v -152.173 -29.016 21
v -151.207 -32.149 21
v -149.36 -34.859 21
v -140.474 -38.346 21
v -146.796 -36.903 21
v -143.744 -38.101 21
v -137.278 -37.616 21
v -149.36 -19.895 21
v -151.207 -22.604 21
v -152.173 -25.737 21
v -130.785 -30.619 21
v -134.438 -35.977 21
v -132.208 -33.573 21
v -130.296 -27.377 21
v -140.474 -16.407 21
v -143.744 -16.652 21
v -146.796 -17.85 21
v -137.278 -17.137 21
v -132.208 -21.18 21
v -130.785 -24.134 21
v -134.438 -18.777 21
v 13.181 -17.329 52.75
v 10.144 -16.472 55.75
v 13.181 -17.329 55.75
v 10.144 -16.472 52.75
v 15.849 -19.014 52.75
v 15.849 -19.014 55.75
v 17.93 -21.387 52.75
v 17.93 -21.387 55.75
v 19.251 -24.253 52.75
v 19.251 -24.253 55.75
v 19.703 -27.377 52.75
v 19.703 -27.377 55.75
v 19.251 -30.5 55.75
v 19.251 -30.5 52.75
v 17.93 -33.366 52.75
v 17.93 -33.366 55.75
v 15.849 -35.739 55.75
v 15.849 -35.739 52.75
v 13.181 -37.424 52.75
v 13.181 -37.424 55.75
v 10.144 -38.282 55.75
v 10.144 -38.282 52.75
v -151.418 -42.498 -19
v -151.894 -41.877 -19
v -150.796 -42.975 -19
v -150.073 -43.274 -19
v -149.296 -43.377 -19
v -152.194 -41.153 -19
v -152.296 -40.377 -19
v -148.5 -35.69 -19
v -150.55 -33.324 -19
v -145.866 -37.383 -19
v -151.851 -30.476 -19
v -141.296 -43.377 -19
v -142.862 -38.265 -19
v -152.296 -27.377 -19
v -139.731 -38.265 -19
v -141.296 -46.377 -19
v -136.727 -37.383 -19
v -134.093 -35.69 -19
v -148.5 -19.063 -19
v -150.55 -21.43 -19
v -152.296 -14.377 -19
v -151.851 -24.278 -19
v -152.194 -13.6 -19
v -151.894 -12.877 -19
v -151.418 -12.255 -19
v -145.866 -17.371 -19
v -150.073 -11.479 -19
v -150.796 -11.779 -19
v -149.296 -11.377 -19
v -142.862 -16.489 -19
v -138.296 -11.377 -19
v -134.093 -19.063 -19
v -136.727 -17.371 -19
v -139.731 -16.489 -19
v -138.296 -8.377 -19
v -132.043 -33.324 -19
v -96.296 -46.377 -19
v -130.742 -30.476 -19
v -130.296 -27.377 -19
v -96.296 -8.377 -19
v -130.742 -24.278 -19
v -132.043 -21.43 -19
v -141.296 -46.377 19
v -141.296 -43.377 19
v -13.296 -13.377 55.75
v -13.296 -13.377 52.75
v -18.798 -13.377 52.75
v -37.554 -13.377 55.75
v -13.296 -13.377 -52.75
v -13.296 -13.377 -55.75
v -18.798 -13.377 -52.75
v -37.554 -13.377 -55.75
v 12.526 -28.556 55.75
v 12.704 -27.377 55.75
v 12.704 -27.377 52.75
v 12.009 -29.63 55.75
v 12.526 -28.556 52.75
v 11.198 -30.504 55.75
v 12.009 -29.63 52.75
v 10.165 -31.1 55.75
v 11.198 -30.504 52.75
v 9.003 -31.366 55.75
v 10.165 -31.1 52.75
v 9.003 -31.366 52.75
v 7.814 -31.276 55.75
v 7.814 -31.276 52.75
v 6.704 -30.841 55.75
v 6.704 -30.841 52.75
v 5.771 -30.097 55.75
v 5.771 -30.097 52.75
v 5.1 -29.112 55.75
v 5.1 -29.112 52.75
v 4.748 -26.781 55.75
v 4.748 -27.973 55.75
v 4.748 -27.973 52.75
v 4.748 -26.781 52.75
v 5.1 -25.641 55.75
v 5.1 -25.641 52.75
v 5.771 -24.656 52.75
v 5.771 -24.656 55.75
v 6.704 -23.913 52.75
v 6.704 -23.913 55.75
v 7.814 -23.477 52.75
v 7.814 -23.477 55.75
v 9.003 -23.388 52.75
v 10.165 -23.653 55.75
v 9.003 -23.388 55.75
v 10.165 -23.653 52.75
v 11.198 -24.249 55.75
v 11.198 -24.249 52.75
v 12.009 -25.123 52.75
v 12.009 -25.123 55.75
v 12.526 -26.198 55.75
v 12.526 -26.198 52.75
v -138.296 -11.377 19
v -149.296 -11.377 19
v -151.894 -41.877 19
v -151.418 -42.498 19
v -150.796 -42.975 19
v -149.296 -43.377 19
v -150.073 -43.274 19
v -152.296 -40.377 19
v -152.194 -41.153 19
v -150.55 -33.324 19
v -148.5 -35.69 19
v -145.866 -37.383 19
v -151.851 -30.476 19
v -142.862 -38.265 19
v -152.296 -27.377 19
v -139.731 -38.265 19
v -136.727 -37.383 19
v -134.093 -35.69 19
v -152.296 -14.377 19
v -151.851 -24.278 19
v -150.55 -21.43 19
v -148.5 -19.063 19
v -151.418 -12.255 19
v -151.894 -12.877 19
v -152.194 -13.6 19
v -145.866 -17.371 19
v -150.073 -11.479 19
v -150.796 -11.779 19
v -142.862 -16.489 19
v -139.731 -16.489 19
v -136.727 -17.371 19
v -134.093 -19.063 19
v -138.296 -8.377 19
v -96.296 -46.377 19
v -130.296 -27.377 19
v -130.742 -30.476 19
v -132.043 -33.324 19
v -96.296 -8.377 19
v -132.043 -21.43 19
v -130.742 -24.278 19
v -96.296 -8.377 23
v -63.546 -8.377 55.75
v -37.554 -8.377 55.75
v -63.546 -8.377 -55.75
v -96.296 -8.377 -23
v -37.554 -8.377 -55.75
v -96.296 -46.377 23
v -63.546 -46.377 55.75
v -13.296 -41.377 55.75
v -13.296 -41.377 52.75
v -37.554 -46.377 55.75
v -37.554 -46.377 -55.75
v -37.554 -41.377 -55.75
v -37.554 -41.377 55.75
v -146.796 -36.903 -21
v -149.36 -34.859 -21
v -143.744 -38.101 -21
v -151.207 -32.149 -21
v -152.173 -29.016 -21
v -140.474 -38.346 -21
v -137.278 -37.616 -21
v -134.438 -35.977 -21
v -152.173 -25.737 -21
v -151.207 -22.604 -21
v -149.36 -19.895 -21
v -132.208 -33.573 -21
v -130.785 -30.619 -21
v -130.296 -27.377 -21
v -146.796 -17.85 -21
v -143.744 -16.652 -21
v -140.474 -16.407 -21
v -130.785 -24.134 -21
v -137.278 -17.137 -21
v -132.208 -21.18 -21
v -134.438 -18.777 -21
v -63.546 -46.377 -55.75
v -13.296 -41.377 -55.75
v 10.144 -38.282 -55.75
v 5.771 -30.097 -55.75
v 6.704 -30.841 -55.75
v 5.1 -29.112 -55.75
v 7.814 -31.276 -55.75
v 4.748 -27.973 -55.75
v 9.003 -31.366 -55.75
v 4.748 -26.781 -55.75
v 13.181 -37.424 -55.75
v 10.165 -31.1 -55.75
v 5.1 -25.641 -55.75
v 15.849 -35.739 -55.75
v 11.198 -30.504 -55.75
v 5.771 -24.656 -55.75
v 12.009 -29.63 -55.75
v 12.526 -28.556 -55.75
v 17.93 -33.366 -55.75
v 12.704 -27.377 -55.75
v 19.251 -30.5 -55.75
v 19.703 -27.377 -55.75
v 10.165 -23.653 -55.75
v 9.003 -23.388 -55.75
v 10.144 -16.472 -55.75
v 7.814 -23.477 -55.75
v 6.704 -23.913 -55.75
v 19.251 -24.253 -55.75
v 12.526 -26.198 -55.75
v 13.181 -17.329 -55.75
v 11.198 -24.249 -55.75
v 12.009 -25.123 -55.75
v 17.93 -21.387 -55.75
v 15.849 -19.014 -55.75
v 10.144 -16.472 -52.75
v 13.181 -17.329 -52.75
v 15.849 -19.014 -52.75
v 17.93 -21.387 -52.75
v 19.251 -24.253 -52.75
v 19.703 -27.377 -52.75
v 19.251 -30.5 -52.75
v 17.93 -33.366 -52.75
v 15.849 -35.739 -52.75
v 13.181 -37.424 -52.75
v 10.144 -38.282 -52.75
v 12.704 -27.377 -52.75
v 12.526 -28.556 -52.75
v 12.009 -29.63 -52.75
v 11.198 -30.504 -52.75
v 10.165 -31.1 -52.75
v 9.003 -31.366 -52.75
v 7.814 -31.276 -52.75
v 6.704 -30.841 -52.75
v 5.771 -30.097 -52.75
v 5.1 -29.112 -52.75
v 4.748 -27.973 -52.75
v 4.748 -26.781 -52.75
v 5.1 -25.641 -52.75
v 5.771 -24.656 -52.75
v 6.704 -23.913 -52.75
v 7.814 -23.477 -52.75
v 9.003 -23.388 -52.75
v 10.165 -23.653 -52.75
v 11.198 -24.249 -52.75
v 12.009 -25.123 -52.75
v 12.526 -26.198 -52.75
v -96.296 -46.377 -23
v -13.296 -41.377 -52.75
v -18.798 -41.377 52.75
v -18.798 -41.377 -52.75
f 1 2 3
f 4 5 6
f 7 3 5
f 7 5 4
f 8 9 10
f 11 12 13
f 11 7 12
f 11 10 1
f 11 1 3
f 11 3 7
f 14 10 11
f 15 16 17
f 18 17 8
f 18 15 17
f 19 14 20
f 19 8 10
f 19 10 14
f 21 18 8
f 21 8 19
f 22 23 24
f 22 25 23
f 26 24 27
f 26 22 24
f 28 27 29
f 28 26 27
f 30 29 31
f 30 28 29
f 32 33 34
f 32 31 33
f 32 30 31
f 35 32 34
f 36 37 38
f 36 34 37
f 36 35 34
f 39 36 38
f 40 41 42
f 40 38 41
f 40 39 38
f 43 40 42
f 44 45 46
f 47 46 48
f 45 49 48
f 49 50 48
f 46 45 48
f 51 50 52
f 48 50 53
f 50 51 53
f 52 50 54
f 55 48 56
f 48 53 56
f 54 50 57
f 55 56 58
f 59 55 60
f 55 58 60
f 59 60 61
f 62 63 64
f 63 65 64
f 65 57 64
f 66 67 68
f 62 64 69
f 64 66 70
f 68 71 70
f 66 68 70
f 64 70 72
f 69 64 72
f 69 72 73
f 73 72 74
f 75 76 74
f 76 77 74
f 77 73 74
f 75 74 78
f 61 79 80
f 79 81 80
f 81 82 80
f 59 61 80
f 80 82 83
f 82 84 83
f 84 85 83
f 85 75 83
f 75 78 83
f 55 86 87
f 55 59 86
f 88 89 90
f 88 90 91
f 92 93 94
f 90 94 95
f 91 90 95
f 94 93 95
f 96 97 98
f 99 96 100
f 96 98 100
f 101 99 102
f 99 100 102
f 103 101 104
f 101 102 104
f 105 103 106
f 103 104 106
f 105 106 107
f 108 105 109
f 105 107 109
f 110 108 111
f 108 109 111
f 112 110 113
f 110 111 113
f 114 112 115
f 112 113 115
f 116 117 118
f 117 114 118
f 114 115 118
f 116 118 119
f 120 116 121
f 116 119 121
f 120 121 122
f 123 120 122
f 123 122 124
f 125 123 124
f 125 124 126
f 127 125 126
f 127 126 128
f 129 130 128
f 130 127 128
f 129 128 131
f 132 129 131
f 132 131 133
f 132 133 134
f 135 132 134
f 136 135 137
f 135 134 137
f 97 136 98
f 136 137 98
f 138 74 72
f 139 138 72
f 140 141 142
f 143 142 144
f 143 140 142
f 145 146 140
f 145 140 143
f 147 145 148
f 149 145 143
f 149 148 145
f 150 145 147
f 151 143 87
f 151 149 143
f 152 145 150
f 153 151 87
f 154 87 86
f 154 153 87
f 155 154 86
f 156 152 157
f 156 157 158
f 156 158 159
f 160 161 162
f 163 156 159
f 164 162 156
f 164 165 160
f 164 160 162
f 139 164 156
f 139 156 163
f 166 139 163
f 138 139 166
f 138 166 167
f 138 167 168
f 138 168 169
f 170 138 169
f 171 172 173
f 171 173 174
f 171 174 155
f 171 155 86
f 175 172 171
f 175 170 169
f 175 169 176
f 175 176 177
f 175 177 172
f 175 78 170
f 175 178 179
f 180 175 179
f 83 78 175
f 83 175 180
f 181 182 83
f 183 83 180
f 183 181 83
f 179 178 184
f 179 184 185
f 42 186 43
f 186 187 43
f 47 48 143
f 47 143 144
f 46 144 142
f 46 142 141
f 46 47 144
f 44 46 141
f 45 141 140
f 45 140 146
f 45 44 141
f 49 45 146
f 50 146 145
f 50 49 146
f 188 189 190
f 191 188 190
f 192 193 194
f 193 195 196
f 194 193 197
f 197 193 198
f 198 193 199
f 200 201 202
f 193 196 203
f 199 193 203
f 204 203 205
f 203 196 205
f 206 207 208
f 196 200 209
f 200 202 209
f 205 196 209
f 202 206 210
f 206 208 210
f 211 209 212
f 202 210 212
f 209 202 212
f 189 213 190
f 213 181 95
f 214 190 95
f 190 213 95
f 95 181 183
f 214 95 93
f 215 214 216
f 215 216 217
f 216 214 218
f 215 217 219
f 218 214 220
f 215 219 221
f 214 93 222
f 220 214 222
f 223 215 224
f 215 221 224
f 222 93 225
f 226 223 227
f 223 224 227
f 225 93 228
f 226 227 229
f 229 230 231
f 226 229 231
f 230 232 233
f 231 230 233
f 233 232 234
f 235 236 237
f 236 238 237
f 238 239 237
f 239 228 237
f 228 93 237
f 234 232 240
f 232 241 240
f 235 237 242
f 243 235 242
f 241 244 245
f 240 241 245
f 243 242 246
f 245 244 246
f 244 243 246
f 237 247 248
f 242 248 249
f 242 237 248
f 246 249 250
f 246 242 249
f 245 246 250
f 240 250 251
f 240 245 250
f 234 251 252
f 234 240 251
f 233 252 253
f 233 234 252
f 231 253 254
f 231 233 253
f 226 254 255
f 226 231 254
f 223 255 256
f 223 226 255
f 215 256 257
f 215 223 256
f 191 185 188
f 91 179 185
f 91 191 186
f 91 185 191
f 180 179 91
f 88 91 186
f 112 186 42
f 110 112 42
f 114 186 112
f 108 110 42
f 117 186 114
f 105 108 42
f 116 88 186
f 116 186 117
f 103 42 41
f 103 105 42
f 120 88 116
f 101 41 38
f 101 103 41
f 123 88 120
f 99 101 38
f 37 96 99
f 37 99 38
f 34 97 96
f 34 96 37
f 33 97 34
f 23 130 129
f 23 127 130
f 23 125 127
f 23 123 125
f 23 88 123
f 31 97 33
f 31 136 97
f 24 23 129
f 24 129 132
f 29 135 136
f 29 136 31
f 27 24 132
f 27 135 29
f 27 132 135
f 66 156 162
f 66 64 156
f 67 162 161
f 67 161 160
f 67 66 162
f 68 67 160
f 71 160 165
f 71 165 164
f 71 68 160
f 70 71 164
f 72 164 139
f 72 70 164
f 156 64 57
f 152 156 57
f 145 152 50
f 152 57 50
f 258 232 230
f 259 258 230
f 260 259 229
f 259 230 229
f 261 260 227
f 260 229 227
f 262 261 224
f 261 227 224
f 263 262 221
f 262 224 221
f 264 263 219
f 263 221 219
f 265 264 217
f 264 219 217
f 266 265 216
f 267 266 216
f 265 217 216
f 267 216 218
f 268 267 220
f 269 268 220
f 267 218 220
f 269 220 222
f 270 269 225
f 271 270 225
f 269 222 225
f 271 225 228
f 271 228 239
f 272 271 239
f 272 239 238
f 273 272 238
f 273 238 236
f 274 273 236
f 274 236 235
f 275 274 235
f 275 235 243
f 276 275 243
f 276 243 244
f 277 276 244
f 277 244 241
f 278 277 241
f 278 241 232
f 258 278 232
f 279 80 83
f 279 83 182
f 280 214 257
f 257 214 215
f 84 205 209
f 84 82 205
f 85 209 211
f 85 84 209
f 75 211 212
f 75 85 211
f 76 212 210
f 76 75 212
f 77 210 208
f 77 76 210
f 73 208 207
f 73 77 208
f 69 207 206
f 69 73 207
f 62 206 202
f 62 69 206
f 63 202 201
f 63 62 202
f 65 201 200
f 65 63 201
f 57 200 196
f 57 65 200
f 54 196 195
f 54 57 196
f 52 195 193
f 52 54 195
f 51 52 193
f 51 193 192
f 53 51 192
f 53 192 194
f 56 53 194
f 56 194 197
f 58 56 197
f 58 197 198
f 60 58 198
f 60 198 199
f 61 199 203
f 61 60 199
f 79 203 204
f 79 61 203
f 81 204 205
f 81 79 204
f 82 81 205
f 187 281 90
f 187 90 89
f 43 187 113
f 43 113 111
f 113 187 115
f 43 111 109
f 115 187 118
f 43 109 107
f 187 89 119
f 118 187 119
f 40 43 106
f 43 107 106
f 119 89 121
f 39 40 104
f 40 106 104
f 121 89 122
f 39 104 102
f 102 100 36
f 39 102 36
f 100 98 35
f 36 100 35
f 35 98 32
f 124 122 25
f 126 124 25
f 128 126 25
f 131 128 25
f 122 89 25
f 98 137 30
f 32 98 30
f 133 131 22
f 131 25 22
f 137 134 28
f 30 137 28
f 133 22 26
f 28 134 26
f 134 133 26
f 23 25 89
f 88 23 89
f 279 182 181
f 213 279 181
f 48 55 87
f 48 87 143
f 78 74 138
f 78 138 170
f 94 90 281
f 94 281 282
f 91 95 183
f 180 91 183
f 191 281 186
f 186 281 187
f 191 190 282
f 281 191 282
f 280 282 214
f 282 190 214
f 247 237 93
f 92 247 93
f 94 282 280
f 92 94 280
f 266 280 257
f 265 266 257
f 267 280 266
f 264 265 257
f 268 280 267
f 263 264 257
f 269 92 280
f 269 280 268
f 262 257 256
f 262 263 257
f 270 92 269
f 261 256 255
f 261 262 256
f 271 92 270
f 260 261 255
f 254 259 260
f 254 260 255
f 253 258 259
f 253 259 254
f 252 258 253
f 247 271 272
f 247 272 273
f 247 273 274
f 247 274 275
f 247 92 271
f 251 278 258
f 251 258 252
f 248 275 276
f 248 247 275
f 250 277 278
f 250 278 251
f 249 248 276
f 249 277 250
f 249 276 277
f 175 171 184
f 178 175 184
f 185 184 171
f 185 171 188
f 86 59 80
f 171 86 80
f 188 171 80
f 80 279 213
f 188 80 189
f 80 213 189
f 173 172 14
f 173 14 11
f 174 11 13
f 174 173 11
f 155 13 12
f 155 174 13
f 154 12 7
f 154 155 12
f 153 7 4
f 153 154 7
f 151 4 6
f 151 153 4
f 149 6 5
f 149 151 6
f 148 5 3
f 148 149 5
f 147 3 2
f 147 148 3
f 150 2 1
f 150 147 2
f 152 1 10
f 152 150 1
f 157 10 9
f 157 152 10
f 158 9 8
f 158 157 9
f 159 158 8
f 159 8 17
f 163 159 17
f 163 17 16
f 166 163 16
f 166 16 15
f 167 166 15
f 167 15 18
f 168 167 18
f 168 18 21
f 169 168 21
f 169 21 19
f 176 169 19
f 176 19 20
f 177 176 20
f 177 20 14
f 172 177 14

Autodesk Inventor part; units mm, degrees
ref_plane "YZ Plane" through (0, 0, 0) normal (1, 0, 0) x (0, 1, 0)
ref_plane "XZ Plane" through (0, 0, 0) normal (0, 1, 0) x (-1, 0, 0)
ref_plane "XY Plane" through (0, 0, 0) normal (0, 0, 1) x (1, 0, 0)
sketch "Sketch1" plane through (0, 0, 0) normal (0, 0, 1) x (1, 0, 0)
  circle A0 centre (-141.2963, -27.3767) radius 11
  line L0 (-141.2963, -11.3767) -> (-149.2963, -11.3767)
  line L1 (-152.2963, -14.3767) -> (-152.2963, -27.3767)
  line L2 (-152.2963, -27.3767) -> (-152.2963, -40.3767)
  line L3 (-141.2963, -11.3767) -> (-138.2963, -11.3767)
  line L4 (-138.2963, -11.3767) -> (-138.2963, -8.3767)
  line L5 (-138.2963, -8.3767) -> (-70.2823, -8.3767)
  line L6 (-141.2963, -46.3767) -> (-70.2823, -46.3767)
  line L7 (-141.2963, -46.3767) -> (-141.2963, -43.3767)
  line L8 (-141.2963, -43.3767) -> (-149.2963, -43.3767)
  arc A1 (-149.2963, -11.3767) -> (-152.2963, -14.3767) centre (-149.2963, -14.3767) ccw
  arc A2 (-152.2963, -40.3767) -> (-149.2963, -43.3767) centre (-149.2963, -40.3767) ccw
  line L9 (-23.7963, -41.3767) -> (-13.2963, -41.3767)
  line L10 (-13.2963, -41.3767) -> (10.1436, -38.2818)
  arc A3 (10.1436, -38.2818) -> (10.1436, -16.4717) centre (8.7037, -27.3767) ccw
  line L11 (10.1436, -16.4717) -> (-13.2963, -13.3767)
  line L12 (-13.2963, -13.3767) -> (-37.5536, -13.3767)
  circle A4 centre (8.7037, -27.3767) radius 4
  line L13 (-37.5536, -13.3767) -> (-37.5536, -8.3767)
  line L14 (-37.5536, -8.3767) -> (-70.2823, -8.3767)
  line L15 (-70.2823, -46.3767) -> (-37.5536, -46.3767)
  line L16 (-37.5536, -46.3767) -> (-37.5536, -41.3767)
  line L17 (-23.7963, -41.3767) -> (-37.5536, -41.3767)
  dimension "d18" = 22
  dimension "d20" = 16
  dimension "d22" = 3
  dimension "d27" = 3
extrude "Extrusion6" add sketch "Sketch1" along normal mid plane 111.5 contours A0 | L1 A1 L0 L3 L4 L5 L14 L13 L12 L11 A3 L10 L9 L17 L16 L15 L6 L7 L8 A2 L2
sketch "Sketch5" plane through (-138.2963, -8.3767, 55.75) normal (0, 1, 0) x (1, 0, 0)
  line L0 (100.7426, 0) -> (100.7426, 111.5) projected
  line L1 (100.7426, 0) -> (100.7426, 3)
  line L2 (100.7426, 3) -> (159.7547, 3)
  line L3 (100.7426, 111.5) -> (100.7426, 108.5)
  line L4 (100.7426, 108.5) -> (159.7547, 108.5)
  line L5 (159.7547, 108.5) -> (159.7547, 3)
  line L6 (100.7426, 3) -> (100.7426, 108.5)
  line L7 (157.9988, 3) -> (119.4988, 3)
  line L8 (119.4988, 3) -> (119.4988, 108.5)
  point P0 (138.2963, 55.75)
  dimension "d32" = 3
  dimension "d33" = 3
  dimension "d34" = 38.5
extrude "Extrusion7" cut sketch "Sketch5" against normal blind 105.5 contours L8 L4 L5 L2
sketch "Sketch6" plane through (-138.2963, -8.3767, 55.75) normal (0, 1, 0) x (1, 0, 0)
  line L0 (0, 0) -> (100.7426, 0) projected
  line L1 (100.7426, 111.5) -> (0, 111.5) projected
  line L2 (-11, 0) -> (0, 0) projected
  line L3 (0, 0) -> (0, 111.5) projected
  line L4 (0, 111.5) -> (-11, 111.5) projected
  line L5 (-11, 0) -> (-11, 111.5) projected
  line L6 (125, 3) -> (119.4988, 3) projected
  line L7 (119.4988, 3) -> (119.4988, 108.5) projected
  line L8 (119.4988, 108.5) -> (125, 108.5) projected
  line L9 (125, 108.5) -> (125, 111.5) projected
  line L10 (125, 111.5) -> (100.7426, 111.5) projected
  line L11 (100.7426, 0) -> (100.7426, 111.5) projected
  line L12 (100.7426, 0) -> (125, 0) projected
  line L13 (125, 0) -> (125, 3) projected
  line L14 (-14, 0) -> (-11, 0) projected
  line L15 (-11, 0) -> (-11, 111.5) projected
  line L16 (-11, 111.5) -> (-14, 111.5) projected
  line L17 (-14, 0) -> (-14, 111.5) projected
  line L18 (-14, 0) -> (-14, 111.5) projected
  line L19 (-14, 0) -> (-14, 111.5) projected
  line L20 (-14, 55.75) -> (-3, 55.75)
  line L21 (-3, 55.75) -> (-3, 74.75)
  line L22 (-3, 74.75) -> (-14, 74.75)
  line L23 (-3, 55.75) -> (-3, 36.75)
  line L24 (-3, 36.75) -> (-14, 36.75)
  line L25 (-11, 55.75) -> (42, 55.75)
  line L26 (42, 55.75) -> (42, 78.75)
  line L27 (42, 78.75) -> (74.75, 111.5)
  line L28 (-3, 74.75) -> (42, 74.75)
  line L29 (42, 55.75) -> (42, 32.75)
  line L30 (42, 32.75) -> (74.75, 0)
  line L31 (-3, 36.75) -> (42, 36.75)
  line L32 (74.75, 111.5) -> (-14, 111.5)
  line L33 (-14, 111.5) -> (-14, 74.75)
  line L34 (-14, 36.75) -> (-14, 0)
  line L35 (-14, 0) -> (74.75, 0)
  point P0 (138.2963, 55.75)
  dimension "d37" = 11
  dimension "d38" = 19
  dimension "d39" = 19
  dimension "d40" = 53
  dimension "d41" = 23
  dimension "d42" = 135
  dimension "d43" = 23
extrude "Extrusion8" cut sketch "Sketch6" against normal blind 105.5 contours L3 L31 L29 L30 L0 | L2 L5 L24 L31 L3 | L14 L17 L24 L5 | L28 L22 L5 L4 L3 | L3 L1 L27 L26 L28 | L22 L17 L16 L5
extrude "Extrusion9" add sketch "Sketch1" along normal mid plane 42 contours A0
properties part number "ForeArm"
